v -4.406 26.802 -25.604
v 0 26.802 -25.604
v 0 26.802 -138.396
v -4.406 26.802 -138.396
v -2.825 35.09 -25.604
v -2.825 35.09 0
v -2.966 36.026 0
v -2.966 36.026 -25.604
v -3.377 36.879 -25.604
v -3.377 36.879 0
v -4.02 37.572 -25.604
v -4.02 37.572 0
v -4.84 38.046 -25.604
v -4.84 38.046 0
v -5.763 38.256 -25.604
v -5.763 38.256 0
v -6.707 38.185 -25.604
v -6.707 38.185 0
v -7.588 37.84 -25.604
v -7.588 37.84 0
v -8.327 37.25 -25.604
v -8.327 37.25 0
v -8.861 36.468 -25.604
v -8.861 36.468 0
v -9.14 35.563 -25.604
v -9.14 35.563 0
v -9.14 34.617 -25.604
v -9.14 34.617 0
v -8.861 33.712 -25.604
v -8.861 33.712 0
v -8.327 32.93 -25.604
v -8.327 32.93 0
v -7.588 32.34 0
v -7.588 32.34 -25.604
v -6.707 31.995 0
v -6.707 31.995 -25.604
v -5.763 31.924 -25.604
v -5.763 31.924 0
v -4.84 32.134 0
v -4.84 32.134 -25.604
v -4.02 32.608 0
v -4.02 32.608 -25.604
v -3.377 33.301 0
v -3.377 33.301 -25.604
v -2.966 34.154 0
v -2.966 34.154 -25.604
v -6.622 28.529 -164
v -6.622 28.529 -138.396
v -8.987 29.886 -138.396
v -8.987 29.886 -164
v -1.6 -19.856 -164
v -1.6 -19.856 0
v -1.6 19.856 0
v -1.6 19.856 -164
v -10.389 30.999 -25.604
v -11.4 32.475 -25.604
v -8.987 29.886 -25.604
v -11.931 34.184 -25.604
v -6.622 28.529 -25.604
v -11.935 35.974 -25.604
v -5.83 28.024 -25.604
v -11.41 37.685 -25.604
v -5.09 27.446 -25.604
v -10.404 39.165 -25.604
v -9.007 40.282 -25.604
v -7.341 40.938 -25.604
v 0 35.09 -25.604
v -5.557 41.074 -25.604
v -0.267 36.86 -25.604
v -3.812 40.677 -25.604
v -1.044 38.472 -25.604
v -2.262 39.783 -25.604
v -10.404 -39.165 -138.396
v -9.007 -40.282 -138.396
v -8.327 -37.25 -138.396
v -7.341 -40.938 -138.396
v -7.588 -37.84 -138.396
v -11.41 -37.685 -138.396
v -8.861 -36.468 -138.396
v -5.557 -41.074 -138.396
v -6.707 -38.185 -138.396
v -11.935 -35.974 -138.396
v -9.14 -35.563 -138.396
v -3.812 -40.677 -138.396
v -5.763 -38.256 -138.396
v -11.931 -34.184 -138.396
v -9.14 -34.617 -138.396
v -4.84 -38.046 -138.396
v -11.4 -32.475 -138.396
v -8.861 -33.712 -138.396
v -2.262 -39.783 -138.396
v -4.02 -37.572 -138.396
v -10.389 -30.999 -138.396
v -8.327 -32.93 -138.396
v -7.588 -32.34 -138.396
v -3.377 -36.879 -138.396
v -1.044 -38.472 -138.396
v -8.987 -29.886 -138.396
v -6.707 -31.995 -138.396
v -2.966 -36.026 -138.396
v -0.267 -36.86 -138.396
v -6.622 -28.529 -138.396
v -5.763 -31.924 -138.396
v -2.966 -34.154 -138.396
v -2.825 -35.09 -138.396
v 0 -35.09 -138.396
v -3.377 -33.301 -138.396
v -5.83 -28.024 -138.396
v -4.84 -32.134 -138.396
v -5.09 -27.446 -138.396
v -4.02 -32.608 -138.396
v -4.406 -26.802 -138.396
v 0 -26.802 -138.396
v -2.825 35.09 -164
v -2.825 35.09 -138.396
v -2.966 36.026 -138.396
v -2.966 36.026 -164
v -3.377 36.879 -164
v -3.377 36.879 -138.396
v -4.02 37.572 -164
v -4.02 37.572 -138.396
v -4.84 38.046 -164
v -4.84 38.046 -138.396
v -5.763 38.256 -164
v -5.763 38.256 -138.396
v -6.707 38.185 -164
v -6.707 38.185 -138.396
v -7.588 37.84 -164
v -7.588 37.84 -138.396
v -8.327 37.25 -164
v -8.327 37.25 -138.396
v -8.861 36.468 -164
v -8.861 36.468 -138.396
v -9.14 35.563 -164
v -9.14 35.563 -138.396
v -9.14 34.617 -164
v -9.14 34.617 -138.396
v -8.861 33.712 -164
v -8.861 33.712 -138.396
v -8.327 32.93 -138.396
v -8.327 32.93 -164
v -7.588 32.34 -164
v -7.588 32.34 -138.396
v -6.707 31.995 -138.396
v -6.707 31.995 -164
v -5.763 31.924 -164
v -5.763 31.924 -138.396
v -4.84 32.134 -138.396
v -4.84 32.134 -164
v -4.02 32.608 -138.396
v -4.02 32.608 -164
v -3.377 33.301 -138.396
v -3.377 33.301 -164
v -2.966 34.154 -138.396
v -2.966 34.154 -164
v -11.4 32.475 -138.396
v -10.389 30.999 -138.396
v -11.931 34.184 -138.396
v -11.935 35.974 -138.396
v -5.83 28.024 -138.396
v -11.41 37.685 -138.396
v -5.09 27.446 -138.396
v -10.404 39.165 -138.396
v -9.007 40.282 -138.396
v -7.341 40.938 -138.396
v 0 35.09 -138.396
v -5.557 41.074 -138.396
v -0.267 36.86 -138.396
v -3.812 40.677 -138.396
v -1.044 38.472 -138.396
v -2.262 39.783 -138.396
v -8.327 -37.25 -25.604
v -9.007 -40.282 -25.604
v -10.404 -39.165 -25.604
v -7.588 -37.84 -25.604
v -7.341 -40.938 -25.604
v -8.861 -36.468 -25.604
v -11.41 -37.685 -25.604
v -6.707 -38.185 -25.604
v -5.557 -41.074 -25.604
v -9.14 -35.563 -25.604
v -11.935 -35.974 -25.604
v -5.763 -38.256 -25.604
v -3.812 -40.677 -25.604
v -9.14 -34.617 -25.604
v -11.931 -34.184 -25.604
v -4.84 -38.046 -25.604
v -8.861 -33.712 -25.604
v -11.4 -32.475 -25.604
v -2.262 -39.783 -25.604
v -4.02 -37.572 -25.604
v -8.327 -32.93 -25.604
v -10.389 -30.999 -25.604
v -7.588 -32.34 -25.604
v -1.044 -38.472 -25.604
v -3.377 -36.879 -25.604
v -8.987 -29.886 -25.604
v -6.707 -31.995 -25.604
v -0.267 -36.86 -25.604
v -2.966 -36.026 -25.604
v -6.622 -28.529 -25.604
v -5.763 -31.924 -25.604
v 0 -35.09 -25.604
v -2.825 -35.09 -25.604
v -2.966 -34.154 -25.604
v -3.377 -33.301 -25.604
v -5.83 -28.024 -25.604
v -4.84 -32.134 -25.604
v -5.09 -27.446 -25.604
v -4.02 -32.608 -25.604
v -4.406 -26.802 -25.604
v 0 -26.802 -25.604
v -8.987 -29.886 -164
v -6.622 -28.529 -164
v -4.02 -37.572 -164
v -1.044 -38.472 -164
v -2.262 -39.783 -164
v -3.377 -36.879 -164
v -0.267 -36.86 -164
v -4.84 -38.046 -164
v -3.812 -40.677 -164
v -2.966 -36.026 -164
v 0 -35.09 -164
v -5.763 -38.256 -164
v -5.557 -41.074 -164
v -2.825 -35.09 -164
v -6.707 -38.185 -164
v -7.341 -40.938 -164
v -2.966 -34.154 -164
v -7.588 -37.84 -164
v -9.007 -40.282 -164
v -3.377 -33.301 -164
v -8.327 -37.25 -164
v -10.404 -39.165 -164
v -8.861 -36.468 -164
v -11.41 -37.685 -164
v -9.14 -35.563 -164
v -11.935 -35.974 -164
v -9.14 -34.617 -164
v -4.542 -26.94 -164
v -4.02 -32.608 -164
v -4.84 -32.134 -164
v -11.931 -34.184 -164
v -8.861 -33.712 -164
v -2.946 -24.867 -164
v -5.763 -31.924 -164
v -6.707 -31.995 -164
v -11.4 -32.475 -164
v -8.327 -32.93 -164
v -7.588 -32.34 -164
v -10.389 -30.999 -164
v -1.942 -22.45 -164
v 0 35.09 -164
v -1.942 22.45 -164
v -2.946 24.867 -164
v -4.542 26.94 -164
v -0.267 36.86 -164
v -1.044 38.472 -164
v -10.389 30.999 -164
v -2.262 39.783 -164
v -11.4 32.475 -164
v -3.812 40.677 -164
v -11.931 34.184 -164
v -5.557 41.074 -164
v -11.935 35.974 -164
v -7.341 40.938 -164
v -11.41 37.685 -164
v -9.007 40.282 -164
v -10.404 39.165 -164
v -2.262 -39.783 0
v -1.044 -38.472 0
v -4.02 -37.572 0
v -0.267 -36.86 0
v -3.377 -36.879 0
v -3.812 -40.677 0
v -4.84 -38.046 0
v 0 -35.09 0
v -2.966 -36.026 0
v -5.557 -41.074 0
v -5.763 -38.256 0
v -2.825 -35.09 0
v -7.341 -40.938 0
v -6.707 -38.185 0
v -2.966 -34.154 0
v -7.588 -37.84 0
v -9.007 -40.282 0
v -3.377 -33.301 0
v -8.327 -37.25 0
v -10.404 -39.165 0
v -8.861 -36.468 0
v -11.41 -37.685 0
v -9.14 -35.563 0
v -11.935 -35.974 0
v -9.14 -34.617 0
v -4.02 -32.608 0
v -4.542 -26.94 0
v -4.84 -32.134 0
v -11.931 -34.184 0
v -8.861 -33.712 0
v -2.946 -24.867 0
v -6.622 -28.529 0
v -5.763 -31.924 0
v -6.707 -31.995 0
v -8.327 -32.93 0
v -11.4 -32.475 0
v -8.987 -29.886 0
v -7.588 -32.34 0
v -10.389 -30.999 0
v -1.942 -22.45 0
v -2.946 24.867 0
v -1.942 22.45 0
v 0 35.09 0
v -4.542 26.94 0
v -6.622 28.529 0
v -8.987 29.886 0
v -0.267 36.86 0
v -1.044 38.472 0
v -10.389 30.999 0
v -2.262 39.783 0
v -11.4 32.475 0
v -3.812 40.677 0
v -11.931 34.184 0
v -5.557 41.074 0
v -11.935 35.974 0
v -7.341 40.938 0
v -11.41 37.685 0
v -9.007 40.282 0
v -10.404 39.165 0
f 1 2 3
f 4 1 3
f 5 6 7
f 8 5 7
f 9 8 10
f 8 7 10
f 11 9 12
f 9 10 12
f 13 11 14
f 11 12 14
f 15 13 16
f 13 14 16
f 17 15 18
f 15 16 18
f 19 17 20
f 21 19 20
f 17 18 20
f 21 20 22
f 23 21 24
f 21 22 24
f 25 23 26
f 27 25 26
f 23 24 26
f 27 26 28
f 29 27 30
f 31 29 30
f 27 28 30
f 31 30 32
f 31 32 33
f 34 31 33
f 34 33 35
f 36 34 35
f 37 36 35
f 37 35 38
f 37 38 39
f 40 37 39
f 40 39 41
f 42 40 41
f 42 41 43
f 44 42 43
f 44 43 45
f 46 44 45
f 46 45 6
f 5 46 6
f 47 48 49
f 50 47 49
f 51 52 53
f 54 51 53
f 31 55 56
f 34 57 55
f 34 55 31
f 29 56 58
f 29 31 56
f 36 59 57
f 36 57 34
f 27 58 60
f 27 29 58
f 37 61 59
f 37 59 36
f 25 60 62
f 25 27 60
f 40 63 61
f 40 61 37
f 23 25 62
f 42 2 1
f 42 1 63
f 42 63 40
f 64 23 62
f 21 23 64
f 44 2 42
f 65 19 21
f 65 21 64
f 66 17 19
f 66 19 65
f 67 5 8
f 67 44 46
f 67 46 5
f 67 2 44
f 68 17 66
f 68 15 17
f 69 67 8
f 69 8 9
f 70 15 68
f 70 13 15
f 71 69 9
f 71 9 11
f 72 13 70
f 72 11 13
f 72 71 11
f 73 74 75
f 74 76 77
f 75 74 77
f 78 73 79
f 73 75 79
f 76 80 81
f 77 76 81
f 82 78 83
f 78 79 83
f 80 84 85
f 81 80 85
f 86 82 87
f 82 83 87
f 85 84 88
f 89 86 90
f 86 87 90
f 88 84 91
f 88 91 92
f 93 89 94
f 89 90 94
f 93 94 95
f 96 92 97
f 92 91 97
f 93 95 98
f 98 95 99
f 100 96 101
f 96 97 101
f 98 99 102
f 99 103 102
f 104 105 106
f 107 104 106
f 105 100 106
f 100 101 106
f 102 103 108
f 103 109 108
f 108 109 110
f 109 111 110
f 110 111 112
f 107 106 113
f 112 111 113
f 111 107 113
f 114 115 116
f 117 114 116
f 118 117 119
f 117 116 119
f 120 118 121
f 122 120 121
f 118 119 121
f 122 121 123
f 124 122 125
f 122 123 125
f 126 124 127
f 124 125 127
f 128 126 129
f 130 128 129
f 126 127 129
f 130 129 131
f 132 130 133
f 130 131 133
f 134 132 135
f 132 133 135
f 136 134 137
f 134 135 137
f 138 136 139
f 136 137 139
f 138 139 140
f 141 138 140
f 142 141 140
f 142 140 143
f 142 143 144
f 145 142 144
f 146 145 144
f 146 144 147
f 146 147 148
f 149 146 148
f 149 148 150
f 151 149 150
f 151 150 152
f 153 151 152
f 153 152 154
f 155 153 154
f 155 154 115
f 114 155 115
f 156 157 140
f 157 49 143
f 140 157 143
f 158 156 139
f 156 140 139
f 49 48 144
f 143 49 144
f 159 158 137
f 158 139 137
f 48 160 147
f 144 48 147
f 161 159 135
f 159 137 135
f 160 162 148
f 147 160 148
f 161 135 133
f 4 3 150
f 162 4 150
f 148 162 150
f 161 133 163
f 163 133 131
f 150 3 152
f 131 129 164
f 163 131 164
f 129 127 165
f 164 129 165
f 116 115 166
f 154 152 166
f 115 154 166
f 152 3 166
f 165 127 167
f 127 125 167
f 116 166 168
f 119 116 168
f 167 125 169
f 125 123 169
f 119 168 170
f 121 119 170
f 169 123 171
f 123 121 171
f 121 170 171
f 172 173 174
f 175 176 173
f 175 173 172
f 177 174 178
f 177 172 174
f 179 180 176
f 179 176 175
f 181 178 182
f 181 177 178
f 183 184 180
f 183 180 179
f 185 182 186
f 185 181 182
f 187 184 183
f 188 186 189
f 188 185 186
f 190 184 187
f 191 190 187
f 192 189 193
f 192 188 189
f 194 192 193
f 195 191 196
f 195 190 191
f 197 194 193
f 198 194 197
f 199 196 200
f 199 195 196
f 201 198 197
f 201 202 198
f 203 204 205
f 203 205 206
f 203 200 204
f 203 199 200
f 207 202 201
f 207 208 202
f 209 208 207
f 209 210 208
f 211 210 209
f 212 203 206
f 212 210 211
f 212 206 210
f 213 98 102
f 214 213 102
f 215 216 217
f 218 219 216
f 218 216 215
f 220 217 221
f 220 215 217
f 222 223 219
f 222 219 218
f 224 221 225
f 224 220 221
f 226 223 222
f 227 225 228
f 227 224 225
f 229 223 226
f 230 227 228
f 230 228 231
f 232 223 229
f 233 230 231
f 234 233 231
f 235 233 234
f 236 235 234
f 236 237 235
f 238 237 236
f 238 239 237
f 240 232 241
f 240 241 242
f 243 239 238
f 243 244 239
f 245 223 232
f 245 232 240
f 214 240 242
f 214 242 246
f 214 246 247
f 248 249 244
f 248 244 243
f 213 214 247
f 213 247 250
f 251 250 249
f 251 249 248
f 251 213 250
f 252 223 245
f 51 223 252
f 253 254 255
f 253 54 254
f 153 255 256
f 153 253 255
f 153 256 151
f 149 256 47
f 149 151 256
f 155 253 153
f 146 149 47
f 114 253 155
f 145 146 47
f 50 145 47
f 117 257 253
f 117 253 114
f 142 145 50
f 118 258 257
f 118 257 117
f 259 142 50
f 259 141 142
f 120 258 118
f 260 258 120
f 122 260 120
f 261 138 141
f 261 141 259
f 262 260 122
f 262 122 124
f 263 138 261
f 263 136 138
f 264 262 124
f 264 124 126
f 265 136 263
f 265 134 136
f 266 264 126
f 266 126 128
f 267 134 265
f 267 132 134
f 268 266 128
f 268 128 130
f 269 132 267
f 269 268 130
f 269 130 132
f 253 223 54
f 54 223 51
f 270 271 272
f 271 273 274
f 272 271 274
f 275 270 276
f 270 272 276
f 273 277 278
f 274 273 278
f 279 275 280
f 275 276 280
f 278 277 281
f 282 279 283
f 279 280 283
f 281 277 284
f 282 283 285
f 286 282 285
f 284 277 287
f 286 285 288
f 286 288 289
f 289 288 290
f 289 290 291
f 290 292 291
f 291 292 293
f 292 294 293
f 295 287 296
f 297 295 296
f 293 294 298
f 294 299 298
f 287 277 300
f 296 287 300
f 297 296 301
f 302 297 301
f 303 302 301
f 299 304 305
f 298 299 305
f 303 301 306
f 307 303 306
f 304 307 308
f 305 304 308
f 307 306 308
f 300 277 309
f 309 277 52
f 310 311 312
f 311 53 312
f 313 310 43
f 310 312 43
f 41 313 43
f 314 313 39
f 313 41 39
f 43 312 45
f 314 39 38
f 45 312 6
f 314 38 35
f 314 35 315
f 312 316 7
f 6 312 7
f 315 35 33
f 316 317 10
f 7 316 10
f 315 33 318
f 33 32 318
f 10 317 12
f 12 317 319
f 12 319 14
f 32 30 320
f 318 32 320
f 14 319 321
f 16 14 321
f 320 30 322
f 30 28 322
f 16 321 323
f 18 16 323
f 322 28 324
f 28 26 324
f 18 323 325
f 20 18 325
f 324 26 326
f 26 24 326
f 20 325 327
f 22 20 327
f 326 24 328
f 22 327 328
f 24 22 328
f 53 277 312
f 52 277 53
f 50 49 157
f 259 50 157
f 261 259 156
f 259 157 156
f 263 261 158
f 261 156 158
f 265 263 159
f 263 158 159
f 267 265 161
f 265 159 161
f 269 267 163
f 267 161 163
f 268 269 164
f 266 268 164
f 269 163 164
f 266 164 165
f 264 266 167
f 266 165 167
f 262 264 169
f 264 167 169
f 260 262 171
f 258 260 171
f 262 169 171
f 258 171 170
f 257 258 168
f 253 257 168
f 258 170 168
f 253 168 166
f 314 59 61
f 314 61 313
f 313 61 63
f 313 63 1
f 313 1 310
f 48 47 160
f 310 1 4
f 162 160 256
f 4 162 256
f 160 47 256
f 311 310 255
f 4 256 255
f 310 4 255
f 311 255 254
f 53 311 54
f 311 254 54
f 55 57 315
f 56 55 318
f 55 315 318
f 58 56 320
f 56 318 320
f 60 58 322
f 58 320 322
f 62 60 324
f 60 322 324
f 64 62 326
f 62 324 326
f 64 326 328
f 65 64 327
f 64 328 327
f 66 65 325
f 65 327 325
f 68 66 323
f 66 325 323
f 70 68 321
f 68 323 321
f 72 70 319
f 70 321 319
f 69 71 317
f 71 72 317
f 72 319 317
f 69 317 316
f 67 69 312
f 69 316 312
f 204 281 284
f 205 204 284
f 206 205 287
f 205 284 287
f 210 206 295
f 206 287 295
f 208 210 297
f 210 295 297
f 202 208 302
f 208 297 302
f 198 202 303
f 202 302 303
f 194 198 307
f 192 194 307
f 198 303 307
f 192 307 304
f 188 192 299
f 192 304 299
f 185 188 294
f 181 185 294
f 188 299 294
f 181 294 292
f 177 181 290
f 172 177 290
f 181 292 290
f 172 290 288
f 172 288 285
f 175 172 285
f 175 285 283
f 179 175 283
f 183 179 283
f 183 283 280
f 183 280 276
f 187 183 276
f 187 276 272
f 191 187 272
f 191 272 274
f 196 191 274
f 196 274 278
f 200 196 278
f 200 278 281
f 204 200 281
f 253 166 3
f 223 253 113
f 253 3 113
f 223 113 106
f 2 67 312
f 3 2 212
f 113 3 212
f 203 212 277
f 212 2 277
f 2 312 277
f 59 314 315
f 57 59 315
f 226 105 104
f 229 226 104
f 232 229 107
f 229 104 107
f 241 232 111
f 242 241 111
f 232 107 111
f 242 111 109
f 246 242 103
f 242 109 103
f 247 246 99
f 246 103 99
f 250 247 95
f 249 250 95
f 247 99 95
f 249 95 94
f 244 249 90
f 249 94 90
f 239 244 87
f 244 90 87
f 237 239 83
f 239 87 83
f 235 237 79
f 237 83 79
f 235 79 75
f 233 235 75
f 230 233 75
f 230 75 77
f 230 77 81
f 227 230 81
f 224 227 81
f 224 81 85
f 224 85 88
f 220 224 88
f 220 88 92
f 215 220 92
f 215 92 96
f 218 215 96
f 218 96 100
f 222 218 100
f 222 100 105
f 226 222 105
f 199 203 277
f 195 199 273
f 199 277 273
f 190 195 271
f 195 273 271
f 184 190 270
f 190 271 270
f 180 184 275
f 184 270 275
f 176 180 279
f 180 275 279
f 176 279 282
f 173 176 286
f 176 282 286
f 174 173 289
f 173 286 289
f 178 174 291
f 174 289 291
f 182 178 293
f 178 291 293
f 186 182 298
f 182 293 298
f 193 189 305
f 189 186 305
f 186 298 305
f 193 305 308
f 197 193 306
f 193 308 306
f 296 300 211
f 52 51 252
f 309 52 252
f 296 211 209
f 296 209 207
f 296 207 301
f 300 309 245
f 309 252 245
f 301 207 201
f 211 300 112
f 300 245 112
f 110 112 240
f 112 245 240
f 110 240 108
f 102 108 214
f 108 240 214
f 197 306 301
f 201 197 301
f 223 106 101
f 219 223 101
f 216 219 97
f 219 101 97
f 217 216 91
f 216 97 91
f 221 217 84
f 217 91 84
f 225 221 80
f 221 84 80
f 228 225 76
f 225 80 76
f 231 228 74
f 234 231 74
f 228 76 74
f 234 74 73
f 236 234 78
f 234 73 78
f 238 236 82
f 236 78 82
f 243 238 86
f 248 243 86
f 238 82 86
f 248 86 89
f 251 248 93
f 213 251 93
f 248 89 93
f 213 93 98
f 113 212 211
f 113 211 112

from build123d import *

# Parameters (mm, degrees)
CROQUIS1_R              = 3.175
SALIENTE_EXTRUIR1_DEPTH = 164
REDONDEO1_R             = 10
CROQUIS3_W              = 112.791812306
CROQUIS3_H              = 18.145434914
CORTAR_EXTRUIR2_DEPTH   = 13


with BuildPart() as part:
    # Croquis1 → Saliente-Extruir1 (new body)
    with BuildSketch(Plane.XY):
        with BuildLine():
            Line((-1.6, 25.646228096), (-8.98691391, 29.886314259))
            ThreePointArc((-8.98691391, 29.886314259), (-9.006535925, 40.28237342), (0, 35.09))
            Line((0, 35.09), (0, -35.09))
            ThreePointArc((0, -35.09), (-9.006535925, -40.28237342), (-8.98691391, -29.886314259))
            Line((-8.98691391, -29.886314259), (-1.6, -25.646228096))
            Line((-1.6, -25.646228096), (-1.6, 25.646228096))
        make_face()
        with Locations((-6, 35.09)):
            Circle(CROQUIS1_R, mode=Mode.SUBTRACT)
        with Locations((-6, -35.09)):
            Circle(CROQUIS1_R, mode=Mode.SUBTRACT)
    extrude(amount=-SALIENTE_EXTRUIR1_DEPTH)

    # Redondeo1
    redondeo1_edges = [part.edges().sort_by_distance(p)[0] for p in [
        (-1.6, -25.646228096, -82),
        (-1.6, 25.646228096, -82),
    ]]
    fillet(redondeo1_edges, radius=REDONDEO1_R)

    # Croquis3 → Cortar-Extruir2 (cut, through all)
    with BuildSketch(Plane(origin=(0, 0, 0), x_dir=(0, 0, -1), z_dir=(1, 0, 0))):
        with Locations((82, 35.875128035)):
            Rectangle(CROQUIS3_W, CROQUIS3_H)
        with Locations((82, -35.875128035)):
            Rectangle(CROQUIS3_W, CROQUIS3_H)
    extrude(amount=-CORTAR_EXTRUIR2_DEPTH, mode=Mode.SUBTRACT)


solid = part.part
